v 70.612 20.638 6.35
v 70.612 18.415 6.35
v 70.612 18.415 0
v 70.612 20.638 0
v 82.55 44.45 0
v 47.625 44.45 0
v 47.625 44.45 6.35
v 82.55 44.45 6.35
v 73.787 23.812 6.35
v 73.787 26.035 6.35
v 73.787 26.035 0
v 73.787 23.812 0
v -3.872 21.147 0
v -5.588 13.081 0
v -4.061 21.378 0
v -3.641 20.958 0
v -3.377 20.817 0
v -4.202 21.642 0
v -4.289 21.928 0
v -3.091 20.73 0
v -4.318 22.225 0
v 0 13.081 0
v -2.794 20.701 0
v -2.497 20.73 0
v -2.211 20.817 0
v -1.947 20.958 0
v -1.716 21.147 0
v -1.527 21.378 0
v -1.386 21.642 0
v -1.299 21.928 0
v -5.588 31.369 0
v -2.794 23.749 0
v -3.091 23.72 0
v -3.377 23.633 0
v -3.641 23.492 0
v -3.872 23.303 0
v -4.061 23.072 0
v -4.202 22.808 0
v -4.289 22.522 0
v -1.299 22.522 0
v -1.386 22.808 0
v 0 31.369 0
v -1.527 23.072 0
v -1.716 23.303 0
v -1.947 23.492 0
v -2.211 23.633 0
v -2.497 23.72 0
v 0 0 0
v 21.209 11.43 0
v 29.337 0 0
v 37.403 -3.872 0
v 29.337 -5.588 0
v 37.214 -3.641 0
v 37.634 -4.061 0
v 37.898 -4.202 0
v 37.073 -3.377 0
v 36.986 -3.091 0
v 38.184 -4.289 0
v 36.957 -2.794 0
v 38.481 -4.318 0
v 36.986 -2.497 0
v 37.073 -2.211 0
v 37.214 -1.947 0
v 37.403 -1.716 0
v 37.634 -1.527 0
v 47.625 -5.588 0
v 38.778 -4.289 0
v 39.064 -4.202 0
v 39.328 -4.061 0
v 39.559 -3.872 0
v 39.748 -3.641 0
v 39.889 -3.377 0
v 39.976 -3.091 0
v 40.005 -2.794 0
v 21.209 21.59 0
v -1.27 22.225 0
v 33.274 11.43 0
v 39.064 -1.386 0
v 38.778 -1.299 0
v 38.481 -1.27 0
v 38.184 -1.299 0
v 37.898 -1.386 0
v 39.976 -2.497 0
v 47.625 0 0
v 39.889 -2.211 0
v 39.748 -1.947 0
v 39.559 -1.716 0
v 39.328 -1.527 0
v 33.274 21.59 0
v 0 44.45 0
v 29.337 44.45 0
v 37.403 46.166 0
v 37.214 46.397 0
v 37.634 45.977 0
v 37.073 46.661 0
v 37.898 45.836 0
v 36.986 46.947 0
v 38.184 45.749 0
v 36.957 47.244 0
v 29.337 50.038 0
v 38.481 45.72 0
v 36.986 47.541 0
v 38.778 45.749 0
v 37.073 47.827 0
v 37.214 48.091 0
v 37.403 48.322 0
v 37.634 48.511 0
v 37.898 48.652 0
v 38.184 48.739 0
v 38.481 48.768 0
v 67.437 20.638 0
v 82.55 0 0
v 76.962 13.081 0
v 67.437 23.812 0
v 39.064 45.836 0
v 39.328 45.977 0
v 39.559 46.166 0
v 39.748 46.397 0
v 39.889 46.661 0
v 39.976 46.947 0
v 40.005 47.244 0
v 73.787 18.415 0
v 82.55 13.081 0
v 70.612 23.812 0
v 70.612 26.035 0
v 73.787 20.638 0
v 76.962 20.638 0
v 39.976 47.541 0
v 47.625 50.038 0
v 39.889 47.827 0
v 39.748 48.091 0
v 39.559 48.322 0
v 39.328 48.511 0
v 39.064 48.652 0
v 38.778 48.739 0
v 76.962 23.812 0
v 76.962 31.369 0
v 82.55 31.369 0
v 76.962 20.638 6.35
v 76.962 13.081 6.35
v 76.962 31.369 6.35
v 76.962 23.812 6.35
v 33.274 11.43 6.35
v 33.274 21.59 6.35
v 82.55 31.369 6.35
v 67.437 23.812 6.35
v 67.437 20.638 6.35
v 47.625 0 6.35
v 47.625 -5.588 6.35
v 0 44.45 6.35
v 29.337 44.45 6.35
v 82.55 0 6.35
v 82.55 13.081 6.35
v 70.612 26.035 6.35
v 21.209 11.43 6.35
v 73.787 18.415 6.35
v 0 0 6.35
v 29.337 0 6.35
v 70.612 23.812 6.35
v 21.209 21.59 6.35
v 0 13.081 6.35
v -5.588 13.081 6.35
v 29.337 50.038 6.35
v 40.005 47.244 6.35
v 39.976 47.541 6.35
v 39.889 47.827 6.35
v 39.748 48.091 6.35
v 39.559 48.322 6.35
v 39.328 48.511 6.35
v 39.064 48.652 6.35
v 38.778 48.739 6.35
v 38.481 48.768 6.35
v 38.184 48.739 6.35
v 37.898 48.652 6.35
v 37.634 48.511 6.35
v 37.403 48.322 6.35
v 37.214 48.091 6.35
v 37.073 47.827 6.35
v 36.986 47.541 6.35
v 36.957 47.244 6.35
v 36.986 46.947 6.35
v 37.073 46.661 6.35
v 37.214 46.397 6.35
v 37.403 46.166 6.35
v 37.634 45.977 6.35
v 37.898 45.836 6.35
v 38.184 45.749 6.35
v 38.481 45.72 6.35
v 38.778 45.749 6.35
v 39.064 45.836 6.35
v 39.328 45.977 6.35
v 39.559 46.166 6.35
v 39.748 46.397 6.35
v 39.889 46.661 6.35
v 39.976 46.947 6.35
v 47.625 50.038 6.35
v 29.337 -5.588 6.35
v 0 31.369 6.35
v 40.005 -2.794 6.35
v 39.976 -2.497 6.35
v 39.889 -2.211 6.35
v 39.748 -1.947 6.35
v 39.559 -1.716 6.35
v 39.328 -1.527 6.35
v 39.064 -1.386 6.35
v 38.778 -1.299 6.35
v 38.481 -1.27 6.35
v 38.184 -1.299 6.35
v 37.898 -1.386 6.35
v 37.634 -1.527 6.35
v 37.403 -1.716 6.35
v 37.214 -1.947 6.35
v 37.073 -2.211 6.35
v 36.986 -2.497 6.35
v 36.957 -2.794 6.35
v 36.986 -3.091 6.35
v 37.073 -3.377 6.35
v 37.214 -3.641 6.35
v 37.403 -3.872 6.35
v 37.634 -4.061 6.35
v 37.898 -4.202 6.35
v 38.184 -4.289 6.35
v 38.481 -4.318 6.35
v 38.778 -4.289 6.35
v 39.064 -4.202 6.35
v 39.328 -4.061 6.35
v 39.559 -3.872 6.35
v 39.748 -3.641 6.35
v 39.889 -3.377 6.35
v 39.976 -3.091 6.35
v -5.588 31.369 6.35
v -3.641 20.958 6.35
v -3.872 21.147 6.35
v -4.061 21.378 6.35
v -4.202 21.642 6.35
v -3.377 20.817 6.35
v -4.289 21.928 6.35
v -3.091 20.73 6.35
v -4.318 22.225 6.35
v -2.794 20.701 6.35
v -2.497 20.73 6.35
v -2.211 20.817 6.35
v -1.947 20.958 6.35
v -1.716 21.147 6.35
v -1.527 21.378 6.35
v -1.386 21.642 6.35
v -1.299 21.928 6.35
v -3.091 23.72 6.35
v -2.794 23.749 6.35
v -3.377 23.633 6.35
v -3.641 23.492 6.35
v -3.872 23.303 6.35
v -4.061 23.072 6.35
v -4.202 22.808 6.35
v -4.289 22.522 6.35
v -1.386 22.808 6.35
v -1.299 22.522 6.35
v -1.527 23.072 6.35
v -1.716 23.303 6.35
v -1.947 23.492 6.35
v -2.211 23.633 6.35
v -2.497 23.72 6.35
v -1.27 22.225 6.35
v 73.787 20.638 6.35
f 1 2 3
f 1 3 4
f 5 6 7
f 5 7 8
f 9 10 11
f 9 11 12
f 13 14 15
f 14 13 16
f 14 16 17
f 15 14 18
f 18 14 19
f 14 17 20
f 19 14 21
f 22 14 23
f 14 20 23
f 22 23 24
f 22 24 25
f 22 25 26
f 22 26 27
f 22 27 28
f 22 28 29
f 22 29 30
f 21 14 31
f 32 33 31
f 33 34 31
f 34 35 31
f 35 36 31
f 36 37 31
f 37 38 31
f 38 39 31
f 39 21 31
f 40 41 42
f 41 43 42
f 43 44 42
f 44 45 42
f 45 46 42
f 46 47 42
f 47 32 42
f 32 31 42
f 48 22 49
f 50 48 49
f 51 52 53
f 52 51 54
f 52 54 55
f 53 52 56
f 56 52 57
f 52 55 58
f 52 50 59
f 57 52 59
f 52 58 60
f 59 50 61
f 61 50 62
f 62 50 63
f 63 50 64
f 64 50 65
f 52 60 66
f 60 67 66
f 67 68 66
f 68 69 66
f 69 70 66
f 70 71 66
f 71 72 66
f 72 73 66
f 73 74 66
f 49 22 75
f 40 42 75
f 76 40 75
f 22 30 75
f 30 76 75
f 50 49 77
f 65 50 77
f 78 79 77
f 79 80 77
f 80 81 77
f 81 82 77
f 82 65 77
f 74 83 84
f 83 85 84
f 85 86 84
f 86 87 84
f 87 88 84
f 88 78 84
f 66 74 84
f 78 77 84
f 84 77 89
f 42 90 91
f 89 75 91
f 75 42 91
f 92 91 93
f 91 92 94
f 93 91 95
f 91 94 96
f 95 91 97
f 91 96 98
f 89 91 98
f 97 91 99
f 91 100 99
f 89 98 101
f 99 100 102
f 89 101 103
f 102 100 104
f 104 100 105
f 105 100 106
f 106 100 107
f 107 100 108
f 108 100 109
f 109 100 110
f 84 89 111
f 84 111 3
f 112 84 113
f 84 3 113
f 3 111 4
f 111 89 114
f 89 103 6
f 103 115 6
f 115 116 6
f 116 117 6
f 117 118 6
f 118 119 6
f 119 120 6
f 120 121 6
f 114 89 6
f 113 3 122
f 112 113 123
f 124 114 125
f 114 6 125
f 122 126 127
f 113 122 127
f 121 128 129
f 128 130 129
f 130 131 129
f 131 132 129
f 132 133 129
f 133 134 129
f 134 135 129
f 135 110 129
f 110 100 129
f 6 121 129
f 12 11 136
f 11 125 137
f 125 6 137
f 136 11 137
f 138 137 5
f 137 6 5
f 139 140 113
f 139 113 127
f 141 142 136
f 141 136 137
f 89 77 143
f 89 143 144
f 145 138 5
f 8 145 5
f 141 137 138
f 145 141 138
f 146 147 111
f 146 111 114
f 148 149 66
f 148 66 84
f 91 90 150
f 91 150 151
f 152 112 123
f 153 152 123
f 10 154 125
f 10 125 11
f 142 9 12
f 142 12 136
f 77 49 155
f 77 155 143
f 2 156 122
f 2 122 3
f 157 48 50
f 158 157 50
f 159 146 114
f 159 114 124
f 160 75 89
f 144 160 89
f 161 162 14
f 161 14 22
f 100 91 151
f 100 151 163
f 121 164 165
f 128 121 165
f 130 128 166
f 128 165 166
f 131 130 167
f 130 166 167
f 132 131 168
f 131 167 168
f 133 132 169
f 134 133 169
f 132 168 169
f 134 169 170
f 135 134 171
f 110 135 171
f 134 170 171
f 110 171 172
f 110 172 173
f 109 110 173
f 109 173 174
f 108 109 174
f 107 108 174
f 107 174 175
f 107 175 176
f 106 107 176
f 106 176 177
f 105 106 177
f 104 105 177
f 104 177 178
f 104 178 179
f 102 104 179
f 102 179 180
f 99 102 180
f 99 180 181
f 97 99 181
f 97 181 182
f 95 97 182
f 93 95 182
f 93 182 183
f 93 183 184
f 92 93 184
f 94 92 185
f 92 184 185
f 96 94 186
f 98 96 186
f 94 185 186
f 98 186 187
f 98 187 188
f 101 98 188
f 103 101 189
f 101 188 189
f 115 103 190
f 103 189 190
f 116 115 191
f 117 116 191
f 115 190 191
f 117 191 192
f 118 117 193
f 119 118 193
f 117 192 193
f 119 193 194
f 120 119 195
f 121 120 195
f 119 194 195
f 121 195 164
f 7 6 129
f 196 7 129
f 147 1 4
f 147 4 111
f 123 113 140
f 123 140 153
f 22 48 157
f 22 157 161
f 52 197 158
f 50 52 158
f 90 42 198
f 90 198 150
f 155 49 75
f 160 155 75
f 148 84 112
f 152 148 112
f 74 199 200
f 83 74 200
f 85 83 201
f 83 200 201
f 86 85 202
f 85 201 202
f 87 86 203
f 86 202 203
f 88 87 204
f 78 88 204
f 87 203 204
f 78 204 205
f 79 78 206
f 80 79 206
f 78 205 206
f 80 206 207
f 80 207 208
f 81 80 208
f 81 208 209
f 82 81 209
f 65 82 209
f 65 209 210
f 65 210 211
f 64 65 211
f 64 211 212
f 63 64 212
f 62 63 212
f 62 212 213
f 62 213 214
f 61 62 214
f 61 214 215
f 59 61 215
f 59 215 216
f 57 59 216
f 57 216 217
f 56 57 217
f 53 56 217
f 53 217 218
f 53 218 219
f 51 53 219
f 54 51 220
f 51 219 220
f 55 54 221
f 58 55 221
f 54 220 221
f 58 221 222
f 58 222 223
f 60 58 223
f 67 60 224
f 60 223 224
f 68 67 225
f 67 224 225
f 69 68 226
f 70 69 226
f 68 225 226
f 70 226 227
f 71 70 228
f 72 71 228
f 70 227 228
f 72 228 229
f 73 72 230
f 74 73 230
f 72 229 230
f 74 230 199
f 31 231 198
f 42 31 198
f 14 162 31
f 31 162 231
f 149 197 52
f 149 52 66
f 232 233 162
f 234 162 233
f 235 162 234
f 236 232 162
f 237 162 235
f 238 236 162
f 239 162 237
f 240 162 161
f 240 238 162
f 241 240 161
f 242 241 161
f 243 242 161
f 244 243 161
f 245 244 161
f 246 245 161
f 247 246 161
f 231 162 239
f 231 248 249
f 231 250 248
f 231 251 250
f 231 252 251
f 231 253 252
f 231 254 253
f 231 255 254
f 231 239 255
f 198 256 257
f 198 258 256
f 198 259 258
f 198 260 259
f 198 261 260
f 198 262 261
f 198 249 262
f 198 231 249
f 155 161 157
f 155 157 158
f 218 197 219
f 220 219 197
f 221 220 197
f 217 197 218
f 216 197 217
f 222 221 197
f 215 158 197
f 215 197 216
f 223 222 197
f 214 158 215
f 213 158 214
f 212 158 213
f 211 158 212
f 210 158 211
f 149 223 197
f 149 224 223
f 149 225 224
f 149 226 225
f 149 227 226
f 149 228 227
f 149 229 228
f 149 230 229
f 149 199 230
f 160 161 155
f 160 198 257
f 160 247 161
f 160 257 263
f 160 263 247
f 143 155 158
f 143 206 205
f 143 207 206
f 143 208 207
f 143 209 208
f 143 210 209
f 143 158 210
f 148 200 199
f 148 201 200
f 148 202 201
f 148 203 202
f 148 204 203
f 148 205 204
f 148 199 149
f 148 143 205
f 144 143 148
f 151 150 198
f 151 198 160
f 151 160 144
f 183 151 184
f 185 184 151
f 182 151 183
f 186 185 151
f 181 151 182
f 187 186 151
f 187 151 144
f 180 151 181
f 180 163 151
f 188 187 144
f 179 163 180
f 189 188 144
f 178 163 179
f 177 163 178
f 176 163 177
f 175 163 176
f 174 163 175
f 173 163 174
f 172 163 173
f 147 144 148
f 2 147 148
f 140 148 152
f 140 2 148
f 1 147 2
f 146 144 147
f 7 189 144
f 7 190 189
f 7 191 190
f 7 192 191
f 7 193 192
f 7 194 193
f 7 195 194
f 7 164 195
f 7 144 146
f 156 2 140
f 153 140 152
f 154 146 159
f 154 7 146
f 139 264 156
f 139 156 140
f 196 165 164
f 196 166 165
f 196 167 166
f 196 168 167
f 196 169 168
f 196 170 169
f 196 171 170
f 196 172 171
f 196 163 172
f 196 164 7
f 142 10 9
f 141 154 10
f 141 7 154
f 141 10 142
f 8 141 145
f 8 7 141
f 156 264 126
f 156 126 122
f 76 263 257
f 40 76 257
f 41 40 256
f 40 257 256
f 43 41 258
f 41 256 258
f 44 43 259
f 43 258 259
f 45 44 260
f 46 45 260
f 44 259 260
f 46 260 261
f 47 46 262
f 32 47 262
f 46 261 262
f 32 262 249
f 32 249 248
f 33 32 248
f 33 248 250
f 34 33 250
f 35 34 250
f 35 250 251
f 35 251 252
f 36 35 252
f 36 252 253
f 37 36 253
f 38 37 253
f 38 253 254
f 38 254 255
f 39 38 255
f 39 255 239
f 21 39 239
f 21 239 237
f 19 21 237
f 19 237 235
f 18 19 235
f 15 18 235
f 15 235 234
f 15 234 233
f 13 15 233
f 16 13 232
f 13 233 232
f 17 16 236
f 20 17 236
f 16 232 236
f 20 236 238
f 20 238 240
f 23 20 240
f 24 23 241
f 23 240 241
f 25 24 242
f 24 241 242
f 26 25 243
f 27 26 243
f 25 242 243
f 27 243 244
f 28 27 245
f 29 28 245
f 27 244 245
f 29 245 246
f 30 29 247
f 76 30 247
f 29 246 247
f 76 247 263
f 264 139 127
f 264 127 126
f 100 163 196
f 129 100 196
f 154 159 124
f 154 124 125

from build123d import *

# Parameters (mm, degrees)
SKETCH1_W           = 82.55
SKETCH1_H           = 44.45
BOSS_EXTRUDE1_DEPTH = 6.35
SKETCH2_W           = 5.588
SKETCH2_H           = 18.288
BOSS_EXTRUDE2_DEPTH = 6.35
SKETCH5_W           = 18.288
SKETCH5_H           = 5.588
BOSS_EXTRUDE3_DEPTH = 6.35
SKETCH3_W           = 5.588
SKETCH3_H           = 18.288
CUT_EXTRUDE1_DEPTH  = 97.739994025
SKETCH6_R           = 1.524
CUT_EXTRUDE2_DEPTH  = 97.739994025
SKETCH7_W           = 12.065
SKETCH7_H           = 10.16
CUT_EXTRUDE4_DEPTH  = 97.739994025


with BuildPart() as part:
    # Sketch1 → Boss-Extrude1 (new body)
    with BuildSketch(Plane.XY):
        with Locations((41.275, 22.225)):
            Rectangle(SKETCH1_W, SKETCH1_H)
    extrude(amount=BOSS_EXTRUDE1_DEPTH)

    # Sketch2 → Boss-Extrude2 (add)
    with BuildSketch(Plane.XY.offset(6.35)):
        with Locations((-2.794, 22.225)):
            Rectangle(SKETCH2_W, SKETCH2_H)
    extrude(amount=-BOSS_EXTRUDE2_DEPTH)

    # Sketch5 → Boss-Extrude3 (add)
    with BuildSketch(Plane.XY.offset(6.35)):
        with Locations((38.481, 47.244)):
            Rectangle(SKETCH5_W, SKETCH5_H)
        with Locations((38.481, -2.794)):
            Rectangle(SKETCH5_W, SKETCH5_H)
    extrude(amount=-BOSS_EXTRUDE3_DEPTH)

    # Sketch3 → Cut-Extrude1 (cut, through all)
    with BuildSketch(Plane.XY.offset(6.35)):
        with Locations((79.756, 22.225)):
            Rectangle(SKETCH3_W, SKETCH3_H)
    extrude(amount=-CUT_EXTRUDE1_DEPTH, mode=Mode.SUBTRACT)

    # Sketch6 → Cut-Extrude2 (cut, through all)
    with BuildSketch(Plane.XY.offset(6.35)):
        with Locations((-2.794, 22.225)):
            Circle(SKETCH6_R)
        with Locations((38.481, -2.794)):
            Circle(SKETCH6_R)
        with Locations((38.481, 47.244)):
            Circle(SKETCH6_R)
        Polygon((67.437, 23.8125), (70.612, 23.8125), (70.612, 26.035), (73.787, 26.035), (73.787, 23.8125), (76.962, 23.8125), (76.962, 20.6375), (73.787, 20.6375), (73.787, 18.415), (70.612, 18.415), (70.612, 20.6375), (67.437, 20.6375), align=None)
    extrude(amount=-CUT_EXTRUDE2_DEPTH, mode=Mode.SUBTRACT)

    # Sketch7 → Cut-Extrude4 (cut, through all)
    with BuildSketch(Plane.XY):
        with Locations((27.2415, 16.51)):
            Rectangle(SKETCH7_W, SKETCH7_H)
    extrude(amount=CUT_EXTRUDE4_DEPTH, mode=Mode.SUBTRACT)


solid = part.part
